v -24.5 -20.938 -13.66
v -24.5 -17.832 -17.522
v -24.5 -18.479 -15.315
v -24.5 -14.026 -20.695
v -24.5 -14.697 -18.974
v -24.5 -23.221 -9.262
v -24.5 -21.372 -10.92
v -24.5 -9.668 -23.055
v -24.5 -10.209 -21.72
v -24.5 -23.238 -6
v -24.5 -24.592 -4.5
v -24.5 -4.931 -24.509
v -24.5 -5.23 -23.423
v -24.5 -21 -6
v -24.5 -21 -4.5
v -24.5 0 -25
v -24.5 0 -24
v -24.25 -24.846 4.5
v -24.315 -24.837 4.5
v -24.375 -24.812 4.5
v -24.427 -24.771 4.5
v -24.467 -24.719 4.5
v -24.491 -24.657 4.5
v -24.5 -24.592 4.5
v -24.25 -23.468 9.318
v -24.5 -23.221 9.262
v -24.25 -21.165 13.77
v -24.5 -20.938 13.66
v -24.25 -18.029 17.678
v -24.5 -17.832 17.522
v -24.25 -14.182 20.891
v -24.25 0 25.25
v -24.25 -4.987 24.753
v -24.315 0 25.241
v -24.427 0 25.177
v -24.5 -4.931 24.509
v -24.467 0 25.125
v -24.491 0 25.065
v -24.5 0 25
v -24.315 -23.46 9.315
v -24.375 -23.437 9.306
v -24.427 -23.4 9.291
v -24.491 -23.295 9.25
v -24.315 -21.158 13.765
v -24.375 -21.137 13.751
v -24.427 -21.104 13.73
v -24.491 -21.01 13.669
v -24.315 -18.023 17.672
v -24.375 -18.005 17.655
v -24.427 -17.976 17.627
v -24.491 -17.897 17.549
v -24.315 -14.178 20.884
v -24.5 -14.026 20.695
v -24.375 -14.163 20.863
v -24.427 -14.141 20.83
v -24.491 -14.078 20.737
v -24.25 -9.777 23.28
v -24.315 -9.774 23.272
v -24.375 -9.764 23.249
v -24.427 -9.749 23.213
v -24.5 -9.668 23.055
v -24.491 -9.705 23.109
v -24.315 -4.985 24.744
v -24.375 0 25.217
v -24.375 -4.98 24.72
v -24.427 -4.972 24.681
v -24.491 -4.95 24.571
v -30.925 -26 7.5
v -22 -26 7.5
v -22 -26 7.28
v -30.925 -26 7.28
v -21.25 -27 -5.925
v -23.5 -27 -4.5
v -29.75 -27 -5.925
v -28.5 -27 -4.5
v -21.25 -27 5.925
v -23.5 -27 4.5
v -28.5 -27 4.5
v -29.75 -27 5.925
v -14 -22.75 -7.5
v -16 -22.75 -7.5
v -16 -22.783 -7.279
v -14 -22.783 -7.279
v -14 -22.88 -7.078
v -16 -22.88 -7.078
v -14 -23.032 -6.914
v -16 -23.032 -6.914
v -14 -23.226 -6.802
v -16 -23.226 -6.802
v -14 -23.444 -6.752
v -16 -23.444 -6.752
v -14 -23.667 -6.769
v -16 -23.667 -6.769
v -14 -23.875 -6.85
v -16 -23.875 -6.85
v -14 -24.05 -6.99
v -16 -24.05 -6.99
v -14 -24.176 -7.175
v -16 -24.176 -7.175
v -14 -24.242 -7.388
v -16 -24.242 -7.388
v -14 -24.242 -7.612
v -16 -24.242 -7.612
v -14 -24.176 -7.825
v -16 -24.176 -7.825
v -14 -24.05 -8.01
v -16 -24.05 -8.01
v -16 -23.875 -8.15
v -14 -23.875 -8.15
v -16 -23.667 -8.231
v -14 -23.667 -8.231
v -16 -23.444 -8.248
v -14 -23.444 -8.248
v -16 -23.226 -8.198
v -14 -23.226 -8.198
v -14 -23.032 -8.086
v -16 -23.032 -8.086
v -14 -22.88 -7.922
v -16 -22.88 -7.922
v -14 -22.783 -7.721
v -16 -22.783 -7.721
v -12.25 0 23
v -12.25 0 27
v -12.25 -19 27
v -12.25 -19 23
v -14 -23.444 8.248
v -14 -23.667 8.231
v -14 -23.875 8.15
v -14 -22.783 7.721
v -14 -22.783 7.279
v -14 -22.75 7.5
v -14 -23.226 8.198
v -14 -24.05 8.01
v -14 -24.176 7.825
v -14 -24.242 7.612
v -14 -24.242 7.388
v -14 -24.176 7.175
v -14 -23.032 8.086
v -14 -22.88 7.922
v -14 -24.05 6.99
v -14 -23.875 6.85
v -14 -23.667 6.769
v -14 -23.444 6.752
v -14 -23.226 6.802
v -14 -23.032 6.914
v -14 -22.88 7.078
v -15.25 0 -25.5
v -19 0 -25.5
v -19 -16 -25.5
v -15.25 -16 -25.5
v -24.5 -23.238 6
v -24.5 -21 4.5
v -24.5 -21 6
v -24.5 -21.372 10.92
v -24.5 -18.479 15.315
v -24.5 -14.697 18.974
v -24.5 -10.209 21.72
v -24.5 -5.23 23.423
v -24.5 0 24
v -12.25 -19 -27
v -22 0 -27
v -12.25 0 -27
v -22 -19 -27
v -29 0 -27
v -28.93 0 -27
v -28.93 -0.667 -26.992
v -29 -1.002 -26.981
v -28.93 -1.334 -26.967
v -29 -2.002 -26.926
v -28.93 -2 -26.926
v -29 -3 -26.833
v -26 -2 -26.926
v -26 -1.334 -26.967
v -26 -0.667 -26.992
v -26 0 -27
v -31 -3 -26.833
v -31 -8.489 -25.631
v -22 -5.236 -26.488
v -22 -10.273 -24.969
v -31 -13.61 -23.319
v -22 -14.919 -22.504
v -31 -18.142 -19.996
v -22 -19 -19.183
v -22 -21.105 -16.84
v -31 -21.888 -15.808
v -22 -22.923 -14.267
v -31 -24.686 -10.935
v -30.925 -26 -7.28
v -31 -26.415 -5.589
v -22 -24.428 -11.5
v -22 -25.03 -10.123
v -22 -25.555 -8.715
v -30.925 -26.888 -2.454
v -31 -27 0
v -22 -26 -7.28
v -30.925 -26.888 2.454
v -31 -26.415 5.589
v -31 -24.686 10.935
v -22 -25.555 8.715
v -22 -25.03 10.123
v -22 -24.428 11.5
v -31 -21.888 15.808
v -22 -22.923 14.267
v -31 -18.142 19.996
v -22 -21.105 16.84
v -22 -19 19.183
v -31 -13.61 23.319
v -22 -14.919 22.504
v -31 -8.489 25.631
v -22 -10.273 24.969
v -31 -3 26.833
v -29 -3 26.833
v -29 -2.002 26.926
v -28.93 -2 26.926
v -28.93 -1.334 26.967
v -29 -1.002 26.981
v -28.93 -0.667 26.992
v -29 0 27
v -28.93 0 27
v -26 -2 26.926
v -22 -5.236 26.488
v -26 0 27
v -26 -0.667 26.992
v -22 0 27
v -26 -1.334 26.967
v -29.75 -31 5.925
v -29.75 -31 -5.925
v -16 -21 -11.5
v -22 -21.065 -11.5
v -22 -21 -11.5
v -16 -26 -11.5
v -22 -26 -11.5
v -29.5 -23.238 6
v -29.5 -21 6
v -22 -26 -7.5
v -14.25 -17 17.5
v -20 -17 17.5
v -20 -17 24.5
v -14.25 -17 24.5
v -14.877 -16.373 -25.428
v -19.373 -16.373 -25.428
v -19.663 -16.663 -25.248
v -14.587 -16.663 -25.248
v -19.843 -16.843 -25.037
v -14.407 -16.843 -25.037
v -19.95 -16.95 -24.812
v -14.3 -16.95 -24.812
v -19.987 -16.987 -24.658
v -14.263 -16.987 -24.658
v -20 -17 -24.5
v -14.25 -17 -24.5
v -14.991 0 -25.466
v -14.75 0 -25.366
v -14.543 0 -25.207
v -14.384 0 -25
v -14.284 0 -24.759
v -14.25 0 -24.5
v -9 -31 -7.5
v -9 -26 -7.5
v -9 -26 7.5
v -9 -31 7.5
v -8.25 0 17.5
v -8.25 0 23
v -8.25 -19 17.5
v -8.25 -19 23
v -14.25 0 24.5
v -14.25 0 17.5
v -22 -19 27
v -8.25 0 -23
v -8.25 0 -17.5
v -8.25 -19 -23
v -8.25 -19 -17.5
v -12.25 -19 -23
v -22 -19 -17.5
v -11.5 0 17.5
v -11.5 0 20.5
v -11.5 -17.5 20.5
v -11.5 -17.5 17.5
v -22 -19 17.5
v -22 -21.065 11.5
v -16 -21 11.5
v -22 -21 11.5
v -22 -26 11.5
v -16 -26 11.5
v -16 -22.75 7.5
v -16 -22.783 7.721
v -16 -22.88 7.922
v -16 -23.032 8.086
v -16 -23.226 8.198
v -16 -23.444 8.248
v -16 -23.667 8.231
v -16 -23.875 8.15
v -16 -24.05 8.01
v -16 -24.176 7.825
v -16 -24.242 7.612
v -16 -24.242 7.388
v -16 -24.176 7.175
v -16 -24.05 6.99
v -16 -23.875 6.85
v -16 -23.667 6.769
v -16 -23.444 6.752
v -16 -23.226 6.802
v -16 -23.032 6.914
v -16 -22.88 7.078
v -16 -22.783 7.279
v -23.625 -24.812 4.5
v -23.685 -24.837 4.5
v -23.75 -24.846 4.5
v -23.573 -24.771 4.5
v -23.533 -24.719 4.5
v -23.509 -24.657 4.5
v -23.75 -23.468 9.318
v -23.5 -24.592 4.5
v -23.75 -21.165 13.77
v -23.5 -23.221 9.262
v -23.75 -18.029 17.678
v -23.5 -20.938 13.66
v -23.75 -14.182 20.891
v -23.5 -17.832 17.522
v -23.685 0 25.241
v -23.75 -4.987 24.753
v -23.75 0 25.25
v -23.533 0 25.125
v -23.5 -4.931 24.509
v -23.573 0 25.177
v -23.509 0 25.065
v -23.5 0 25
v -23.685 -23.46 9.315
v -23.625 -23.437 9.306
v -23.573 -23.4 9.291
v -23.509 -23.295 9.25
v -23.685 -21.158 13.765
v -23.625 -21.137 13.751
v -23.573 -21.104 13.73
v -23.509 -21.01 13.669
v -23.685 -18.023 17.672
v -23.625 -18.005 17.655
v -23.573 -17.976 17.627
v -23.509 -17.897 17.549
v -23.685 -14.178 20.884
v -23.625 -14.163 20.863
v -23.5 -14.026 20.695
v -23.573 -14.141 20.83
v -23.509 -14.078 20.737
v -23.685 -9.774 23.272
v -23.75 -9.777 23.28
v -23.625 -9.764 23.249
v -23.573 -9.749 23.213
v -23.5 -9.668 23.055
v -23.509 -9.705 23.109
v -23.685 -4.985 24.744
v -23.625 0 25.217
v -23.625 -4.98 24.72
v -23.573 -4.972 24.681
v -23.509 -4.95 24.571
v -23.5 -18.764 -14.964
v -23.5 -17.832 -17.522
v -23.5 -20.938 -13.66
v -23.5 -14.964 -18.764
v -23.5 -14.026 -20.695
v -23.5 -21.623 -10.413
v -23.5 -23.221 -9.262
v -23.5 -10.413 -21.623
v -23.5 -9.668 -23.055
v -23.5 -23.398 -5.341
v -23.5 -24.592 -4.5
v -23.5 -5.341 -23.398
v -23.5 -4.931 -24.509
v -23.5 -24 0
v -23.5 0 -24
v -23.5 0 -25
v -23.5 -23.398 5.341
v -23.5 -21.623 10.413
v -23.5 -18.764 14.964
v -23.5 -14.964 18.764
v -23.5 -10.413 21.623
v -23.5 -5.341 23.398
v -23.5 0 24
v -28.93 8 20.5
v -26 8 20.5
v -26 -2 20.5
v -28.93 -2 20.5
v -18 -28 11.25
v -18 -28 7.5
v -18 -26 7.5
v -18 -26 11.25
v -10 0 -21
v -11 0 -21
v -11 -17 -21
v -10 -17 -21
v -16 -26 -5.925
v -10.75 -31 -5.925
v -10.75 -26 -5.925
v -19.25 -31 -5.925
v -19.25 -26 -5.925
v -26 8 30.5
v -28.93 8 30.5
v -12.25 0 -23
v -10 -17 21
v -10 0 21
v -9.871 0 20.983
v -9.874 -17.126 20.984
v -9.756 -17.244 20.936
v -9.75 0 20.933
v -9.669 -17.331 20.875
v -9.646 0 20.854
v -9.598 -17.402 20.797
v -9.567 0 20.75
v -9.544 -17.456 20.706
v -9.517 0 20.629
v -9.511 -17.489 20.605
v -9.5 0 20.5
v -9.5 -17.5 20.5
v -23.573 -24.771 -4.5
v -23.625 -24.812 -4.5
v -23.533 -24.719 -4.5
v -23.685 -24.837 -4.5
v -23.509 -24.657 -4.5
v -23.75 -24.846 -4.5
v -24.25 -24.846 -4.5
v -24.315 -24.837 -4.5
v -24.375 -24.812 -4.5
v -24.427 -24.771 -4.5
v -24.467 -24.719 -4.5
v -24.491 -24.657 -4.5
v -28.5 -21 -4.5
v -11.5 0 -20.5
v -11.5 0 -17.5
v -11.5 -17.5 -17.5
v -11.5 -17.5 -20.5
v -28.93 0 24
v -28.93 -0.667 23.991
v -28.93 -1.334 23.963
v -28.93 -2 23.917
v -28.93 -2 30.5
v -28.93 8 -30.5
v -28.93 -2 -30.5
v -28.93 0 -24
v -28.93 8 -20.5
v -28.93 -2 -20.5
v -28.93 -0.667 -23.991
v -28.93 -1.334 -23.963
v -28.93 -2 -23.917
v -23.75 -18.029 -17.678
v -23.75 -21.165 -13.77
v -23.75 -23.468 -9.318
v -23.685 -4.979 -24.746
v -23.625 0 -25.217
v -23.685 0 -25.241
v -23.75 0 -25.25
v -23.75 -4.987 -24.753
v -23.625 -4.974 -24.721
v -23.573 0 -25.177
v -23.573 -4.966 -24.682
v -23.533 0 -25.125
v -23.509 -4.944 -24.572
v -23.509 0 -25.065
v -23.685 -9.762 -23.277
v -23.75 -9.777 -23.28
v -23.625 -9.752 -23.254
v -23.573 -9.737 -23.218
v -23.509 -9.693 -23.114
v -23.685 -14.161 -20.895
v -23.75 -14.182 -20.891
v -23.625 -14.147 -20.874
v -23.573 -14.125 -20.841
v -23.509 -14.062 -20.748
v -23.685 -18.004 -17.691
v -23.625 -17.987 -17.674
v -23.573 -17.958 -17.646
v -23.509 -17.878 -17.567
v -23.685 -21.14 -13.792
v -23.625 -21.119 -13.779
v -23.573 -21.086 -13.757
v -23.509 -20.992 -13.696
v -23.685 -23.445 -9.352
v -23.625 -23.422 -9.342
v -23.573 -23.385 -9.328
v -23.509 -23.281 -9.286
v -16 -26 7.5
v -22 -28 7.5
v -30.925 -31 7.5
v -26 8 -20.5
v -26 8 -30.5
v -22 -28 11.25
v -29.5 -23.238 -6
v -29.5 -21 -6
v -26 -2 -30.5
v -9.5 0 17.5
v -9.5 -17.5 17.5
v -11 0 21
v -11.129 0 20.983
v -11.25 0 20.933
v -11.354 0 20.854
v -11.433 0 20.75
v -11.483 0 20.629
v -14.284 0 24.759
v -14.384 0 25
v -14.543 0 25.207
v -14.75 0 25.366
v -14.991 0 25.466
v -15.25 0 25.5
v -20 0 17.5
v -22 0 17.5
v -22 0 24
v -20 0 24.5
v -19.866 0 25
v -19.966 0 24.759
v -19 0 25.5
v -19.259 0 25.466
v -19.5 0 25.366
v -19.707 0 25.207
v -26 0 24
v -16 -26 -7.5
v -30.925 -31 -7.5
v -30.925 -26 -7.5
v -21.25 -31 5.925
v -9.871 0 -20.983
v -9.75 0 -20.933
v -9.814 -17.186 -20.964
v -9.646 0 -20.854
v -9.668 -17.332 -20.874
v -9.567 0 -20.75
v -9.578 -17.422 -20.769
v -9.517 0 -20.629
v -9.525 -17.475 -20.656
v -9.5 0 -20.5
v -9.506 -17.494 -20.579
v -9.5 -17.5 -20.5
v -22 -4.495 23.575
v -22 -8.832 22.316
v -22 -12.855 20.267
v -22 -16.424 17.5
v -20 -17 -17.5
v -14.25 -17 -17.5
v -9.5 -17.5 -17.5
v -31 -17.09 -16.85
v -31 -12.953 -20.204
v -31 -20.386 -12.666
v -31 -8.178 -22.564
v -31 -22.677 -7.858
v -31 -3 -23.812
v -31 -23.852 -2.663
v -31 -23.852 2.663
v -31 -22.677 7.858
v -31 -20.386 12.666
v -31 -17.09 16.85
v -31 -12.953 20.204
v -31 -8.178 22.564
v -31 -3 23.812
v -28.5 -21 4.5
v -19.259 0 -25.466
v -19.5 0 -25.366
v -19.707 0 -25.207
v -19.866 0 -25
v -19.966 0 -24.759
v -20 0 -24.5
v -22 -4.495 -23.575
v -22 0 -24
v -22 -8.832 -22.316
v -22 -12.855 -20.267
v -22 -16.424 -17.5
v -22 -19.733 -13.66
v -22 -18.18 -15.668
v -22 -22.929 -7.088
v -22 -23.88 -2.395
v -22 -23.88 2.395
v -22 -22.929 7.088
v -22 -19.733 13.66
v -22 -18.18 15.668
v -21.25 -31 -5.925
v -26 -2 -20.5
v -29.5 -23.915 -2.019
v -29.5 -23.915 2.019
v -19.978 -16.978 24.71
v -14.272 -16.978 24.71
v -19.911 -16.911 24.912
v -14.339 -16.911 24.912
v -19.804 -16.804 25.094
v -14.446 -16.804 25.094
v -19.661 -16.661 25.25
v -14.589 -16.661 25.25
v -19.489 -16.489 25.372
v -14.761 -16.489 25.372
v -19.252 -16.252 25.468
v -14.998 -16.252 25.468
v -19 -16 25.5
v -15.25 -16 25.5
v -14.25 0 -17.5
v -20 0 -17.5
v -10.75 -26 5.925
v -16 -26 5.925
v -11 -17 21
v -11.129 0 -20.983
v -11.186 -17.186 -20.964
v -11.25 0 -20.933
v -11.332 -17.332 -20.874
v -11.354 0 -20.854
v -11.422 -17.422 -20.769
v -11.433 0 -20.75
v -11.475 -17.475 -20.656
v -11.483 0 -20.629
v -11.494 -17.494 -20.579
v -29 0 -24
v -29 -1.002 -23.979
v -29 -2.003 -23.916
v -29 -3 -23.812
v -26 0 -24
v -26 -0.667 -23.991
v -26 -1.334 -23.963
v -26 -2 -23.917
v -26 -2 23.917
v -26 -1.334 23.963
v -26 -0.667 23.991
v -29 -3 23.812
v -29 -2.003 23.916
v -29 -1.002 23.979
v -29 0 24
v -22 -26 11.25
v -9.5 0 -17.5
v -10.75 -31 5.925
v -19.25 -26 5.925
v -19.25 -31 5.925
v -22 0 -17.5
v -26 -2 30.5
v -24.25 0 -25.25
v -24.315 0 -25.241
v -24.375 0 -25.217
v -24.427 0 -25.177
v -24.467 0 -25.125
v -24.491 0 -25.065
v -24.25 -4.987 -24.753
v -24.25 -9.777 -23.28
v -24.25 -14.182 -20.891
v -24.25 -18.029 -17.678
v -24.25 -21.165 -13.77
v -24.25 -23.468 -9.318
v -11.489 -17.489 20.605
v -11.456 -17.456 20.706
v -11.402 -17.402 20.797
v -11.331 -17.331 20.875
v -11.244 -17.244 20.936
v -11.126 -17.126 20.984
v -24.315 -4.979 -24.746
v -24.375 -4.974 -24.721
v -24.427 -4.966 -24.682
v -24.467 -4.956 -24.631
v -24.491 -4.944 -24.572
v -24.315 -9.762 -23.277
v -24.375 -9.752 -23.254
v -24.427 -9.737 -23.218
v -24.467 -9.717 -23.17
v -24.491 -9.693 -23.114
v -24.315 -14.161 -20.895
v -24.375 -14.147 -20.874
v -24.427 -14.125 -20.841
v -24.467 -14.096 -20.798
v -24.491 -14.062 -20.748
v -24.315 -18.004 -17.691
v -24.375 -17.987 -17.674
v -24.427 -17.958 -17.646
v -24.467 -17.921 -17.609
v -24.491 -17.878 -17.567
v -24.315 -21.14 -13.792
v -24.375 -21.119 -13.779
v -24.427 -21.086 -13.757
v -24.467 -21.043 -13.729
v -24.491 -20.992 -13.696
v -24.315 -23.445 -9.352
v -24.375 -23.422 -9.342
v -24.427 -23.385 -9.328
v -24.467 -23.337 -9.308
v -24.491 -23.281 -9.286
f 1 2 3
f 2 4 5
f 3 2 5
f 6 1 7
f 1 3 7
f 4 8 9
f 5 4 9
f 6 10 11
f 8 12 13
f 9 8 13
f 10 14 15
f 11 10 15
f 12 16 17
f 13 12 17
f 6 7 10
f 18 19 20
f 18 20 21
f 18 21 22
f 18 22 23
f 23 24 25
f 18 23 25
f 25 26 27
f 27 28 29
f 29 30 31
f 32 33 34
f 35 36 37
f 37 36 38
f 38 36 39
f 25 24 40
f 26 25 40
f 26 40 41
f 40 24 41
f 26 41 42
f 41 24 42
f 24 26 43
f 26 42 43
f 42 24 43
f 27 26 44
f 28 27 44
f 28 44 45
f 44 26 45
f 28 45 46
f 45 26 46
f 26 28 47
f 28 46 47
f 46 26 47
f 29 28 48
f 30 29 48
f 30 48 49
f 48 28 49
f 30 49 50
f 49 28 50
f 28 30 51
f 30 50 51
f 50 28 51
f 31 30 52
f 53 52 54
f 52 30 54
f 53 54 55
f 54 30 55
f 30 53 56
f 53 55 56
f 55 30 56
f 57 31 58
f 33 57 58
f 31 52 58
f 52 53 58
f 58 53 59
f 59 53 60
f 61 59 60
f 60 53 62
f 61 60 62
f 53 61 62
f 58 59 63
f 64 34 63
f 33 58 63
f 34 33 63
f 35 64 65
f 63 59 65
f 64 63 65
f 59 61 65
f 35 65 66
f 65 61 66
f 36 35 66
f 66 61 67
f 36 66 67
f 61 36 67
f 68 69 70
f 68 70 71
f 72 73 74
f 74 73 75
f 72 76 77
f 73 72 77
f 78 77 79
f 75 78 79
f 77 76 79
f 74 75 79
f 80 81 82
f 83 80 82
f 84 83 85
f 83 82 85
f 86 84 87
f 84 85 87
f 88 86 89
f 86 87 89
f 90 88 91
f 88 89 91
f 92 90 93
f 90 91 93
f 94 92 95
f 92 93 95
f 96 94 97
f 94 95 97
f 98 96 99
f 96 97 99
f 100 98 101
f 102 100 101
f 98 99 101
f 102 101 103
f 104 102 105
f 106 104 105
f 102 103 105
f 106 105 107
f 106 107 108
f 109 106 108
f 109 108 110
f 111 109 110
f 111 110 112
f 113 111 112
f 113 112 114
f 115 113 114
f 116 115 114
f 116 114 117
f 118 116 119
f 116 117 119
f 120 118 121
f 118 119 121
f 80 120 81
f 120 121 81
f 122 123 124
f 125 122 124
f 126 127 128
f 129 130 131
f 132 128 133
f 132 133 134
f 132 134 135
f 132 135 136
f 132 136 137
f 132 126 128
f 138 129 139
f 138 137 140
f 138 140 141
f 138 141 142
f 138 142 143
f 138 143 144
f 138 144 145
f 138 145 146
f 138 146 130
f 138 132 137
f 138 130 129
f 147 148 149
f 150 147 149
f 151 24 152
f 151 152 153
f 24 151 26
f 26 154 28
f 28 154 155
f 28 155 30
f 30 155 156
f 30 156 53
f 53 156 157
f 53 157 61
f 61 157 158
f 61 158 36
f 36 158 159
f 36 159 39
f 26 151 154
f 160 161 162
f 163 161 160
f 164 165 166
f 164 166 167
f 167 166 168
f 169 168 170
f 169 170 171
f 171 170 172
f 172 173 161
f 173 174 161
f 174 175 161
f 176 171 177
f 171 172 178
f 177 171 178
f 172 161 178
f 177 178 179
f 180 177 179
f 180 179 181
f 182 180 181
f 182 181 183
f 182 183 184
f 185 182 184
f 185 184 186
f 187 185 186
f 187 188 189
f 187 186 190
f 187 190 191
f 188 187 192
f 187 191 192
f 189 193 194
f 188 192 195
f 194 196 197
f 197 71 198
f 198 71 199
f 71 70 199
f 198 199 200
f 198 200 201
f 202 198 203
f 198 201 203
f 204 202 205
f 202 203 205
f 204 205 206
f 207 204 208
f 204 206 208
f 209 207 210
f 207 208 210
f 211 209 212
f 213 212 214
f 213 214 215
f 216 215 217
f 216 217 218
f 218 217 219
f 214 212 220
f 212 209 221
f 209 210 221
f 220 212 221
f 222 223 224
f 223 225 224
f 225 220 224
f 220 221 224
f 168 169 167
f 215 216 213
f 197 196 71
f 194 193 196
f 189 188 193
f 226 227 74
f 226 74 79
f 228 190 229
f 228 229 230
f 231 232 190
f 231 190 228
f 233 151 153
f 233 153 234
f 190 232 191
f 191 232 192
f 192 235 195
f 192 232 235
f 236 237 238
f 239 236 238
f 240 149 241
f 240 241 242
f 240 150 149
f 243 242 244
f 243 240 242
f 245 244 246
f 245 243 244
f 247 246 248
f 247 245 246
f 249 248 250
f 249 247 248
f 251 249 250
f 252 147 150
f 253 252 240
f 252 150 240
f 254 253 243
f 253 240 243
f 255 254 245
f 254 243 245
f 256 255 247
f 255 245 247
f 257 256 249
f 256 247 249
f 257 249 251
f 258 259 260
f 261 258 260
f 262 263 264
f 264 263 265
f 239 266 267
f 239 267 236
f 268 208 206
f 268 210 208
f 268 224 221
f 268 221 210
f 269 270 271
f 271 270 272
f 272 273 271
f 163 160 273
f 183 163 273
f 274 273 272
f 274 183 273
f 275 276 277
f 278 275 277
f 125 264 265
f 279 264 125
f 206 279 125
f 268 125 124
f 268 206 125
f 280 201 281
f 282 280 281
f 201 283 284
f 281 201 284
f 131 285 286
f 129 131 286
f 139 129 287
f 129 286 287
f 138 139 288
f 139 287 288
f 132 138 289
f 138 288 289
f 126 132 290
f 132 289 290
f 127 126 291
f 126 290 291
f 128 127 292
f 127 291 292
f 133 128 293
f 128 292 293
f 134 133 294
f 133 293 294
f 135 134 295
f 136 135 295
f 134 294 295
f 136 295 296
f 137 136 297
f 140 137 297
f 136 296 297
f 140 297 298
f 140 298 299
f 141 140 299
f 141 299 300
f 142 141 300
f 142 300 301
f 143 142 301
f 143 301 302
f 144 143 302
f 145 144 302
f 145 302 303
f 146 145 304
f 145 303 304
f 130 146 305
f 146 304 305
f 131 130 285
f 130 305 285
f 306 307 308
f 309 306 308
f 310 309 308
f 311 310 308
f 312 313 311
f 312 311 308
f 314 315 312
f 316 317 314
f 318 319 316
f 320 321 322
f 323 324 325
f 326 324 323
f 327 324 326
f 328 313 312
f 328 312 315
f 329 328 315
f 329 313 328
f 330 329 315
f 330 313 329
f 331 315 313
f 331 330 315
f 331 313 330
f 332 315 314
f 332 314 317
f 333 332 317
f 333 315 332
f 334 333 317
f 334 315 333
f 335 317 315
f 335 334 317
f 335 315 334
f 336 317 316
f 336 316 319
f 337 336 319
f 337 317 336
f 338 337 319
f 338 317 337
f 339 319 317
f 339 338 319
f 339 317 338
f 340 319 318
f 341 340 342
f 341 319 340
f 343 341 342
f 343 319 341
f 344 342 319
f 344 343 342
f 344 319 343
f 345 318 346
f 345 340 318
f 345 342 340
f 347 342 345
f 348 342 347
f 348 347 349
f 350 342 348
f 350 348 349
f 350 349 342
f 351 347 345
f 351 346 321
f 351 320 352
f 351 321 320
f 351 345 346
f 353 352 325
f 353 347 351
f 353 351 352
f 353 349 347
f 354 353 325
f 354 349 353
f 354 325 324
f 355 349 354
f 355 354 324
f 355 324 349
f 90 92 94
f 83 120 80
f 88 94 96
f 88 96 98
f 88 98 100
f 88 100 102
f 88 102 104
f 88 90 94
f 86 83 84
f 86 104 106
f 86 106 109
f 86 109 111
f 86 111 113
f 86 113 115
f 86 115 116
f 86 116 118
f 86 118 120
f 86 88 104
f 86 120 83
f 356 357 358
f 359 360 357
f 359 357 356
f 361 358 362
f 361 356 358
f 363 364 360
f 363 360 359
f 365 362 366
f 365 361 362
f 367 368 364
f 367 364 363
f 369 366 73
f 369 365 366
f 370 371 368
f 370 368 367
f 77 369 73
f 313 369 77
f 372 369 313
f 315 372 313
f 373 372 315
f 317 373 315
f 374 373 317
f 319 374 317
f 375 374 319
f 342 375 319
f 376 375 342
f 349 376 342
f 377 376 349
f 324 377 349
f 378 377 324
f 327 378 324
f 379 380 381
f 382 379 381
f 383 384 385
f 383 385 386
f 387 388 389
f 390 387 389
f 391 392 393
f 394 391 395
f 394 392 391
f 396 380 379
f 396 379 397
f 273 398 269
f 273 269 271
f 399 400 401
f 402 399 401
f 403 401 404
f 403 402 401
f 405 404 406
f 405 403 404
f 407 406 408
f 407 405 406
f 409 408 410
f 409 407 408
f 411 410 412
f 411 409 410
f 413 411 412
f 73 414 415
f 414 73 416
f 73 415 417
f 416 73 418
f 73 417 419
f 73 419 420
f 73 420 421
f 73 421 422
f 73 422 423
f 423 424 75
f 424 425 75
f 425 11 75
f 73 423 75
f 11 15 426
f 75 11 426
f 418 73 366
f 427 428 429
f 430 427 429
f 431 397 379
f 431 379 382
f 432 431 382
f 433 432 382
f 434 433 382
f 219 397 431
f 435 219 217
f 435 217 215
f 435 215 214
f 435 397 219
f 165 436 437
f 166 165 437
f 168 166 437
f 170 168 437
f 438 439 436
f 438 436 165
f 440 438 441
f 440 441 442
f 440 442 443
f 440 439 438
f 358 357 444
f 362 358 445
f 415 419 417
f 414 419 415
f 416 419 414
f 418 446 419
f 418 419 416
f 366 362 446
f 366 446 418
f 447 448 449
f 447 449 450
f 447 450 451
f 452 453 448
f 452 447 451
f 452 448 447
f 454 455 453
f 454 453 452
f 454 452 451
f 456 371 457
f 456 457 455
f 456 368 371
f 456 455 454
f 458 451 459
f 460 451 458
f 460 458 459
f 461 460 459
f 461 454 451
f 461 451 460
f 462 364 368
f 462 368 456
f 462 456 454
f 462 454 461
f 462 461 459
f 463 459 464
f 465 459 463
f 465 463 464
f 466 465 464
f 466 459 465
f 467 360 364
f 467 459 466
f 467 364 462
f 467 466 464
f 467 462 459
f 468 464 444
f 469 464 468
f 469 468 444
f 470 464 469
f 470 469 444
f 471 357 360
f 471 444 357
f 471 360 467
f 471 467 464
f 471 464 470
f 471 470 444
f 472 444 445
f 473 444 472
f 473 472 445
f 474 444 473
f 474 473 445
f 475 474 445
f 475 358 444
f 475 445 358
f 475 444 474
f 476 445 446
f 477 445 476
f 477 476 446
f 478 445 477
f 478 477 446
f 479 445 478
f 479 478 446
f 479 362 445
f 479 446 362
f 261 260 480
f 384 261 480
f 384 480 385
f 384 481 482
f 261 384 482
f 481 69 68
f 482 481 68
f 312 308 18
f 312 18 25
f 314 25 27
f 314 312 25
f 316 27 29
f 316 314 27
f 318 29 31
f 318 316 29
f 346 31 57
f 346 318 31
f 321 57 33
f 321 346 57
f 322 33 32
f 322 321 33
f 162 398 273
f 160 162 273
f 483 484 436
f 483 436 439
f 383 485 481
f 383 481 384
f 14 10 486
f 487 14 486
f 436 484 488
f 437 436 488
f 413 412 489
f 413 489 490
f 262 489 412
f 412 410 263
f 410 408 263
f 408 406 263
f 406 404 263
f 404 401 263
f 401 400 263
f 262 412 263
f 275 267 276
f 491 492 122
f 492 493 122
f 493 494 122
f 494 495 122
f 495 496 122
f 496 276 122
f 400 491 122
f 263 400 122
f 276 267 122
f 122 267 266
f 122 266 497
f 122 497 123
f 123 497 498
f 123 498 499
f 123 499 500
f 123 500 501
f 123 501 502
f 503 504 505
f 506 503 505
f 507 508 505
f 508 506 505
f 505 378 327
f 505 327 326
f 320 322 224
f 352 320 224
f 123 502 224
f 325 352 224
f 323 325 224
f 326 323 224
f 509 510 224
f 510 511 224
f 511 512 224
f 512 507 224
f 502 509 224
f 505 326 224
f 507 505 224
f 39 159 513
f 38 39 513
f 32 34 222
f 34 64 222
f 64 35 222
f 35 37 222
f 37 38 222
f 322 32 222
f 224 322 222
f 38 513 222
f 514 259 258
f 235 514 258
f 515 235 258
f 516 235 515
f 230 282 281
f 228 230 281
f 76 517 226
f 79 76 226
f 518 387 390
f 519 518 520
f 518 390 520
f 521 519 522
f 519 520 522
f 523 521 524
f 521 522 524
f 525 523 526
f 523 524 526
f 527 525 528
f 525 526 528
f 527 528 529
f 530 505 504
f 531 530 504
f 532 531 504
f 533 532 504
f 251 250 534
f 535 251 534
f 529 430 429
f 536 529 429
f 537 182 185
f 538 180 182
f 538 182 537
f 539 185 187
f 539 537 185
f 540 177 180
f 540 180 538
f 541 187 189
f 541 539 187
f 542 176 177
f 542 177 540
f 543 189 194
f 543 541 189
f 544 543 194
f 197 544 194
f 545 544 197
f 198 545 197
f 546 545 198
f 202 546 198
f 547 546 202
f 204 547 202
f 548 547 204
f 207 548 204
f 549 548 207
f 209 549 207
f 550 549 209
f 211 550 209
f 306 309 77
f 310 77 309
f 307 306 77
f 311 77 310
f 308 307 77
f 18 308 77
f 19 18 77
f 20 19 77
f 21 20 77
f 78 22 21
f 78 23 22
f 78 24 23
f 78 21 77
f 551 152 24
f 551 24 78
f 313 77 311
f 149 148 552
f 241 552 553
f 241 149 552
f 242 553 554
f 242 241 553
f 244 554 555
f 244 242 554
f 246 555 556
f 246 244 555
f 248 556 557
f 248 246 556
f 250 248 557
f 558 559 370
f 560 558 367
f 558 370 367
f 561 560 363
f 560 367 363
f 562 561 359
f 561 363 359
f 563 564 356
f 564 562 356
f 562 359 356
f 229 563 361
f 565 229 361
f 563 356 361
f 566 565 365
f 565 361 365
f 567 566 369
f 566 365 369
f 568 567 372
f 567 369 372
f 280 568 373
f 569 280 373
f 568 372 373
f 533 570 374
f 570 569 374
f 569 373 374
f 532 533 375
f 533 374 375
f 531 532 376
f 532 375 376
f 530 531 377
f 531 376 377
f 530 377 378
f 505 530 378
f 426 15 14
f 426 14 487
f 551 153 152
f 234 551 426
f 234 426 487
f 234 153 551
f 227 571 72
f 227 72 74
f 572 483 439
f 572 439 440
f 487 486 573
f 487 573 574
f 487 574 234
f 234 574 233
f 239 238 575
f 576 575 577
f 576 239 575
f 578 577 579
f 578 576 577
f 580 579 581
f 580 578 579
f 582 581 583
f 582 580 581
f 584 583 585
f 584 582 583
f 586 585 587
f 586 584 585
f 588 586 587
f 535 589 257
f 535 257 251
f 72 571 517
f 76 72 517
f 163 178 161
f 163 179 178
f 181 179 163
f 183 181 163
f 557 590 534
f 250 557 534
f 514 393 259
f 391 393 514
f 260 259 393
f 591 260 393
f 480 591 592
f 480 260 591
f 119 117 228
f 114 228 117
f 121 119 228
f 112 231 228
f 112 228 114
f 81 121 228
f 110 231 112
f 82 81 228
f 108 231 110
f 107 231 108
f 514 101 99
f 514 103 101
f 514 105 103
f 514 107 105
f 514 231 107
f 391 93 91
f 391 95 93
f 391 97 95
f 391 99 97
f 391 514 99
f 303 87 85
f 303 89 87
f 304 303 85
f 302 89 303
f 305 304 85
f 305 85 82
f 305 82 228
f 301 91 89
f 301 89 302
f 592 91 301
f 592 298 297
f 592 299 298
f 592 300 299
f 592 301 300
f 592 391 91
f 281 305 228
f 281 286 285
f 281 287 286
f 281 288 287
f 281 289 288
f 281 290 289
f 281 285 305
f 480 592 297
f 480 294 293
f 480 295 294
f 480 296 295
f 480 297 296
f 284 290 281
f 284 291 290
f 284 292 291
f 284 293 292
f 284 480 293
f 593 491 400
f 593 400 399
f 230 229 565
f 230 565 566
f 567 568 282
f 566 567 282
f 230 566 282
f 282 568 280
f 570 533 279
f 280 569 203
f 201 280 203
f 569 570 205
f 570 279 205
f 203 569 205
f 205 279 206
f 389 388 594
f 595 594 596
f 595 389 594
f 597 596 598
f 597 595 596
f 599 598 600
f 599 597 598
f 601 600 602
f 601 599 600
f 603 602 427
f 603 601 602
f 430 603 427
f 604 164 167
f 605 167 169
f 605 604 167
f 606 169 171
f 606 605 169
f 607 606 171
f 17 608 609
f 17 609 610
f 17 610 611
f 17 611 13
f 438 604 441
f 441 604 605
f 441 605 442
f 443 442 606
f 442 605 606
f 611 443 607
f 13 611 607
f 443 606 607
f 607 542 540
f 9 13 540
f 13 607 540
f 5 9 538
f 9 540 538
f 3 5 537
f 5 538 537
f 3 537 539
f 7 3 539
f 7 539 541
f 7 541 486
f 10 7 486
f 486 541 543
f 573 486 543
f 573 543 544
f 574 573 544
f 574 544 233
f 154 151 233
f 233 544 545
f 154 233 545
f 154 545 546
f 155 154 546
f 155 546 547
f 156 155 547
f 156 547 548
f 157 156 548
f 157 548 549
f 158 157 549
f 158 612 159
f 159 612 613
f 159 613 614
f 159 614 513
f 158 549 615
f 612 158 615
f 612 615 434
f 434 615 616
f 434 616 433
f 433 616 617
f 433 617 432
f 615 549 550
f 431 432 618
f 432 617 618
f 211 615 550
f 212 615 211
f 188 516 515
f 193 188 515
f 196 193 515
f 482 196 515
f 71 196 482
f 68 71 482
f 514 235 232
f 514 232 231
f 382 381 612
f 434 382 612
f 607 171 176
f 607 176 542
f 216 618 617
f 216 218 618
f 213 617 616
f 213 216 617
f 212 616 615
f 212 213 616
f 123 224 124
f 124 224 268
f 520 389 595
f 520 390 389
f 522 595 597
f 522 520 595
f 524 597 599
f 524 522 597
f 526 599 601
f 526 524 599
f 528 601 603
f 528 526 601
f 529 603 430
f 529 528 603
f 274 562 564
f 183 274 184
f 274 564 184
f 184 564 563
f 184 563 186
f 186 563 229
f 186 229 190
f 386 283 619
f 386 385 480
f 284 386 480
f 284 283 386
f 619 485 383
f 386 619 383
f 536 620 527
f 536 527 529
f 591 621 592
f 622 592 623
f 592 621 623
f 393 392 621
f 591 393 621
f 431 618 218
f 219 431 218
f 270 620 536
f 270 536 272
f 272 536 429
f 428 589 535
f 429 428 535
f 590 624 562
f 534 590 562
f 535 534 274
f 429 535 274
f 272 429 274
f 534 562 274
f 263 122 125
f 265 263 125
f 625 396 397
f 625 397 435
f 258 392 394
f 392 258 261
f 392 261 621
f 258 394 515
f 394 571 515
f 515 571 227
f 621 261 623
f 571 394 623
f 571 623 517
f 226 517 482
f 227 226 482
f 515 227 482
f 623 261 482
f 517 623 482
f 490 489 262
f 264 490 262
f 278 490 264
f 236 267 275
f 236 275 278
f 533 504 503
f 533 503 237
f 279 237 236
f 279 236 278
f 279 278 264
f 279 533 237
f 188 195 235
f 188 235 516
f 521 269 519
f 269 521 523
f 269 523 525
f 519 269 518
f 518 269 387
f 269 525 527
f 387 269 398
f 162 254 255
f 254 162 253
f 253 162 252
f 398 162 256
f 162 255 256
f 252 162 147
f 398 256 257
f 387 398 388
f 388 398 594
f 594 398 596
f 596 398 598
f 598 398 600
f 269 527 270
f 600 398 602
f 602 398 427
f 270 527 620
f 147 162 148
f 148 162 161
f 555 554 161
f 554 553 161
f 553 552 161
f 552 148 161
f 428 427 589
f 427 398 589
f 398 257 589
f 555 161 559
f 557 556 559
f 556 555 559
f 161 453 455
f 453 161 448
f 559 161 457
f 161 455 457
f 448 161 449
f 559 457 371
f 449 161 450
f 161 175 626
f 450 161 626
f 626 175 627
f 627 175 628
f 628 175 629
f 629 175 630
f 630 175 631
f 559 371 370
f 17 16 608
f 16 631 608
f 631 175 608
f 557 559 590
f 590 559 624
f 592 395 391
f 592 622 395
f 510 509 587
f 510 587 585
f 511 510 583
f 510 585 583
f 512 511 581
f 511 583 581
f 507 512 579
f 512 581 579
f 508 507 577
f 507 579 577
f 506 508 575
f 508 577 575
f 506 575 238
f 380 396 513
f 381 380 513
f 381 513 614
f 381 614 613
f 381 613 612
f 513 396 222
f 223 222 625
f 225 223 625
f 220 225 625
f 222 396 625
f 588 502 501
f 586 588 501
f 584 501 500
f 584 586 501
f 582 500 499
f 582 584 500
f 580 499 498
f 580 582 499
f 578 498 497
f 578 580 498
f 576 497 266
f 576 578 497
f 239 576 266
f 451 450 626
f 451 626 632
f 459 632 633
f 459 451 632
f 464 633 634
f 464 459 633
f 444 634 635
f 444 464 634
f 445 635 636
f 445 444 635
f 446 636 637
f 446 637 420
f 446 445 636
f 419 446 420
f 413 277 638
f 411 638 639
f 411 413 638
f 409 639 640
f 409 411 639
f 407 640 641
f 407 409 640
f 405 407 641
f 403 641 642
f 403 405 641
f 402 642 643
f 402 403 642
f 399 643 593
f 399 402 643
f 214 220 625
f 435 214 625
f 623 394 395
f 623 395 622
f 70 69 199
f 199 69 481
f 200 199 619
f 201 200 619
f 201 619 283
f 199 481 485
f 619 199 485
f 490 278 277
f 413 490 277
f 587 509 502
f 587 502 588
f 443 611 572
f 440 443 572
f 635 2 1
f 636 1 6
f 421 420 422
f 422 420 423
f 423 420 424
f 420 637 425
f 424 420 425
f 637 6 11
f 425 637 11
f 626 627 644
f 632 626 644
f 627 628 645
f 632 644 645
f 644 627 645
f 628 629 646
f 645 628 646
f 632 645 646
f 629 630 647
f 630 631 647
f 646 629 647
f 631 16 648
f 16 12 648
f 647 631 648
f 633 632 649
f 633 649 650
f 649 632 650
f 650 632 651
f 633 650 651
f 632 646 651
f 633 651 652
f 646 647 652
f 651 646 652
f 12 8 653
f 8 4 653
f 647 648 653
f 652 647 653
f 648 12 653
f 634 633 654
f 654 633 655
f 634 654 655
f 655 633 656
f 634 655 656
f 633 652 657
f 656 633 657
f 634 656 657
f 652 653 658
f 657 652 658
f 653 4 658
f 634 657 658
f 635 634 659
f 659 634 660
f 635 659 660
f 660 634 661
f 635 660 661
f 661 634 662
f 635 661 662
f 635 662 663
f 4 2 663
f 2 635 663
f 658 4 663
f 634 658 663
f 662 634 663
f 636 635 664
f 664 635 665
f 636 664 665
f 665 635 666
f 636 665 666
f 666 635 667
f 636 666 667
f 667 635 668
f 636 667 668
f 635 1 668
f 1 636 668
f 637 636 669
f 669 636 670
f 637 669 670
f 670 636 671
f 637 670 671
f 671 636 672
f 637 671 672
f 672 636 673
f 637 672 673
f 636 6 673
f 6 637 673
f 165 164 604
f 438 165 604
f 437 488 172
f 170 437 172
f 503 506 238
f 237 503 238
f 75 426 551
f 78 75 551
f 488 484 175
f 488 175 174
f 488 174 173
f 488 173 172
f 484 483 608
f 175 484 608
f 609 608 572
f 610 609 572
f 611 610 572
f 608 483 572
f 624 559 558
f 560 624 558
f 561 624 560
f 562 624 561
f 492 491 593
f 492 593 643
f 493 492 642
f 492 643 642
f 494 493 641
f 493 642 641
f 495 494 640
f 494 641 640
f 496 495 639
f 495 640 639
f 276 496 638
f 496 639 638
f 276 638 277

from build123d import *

# Parameters (mm, degrees)
SKETCH062_W                               = 12
SKETCH062_H                               = 12
EXTRUDE035_DEPTH                          = 2
SKETCH061_W                               = 12
SKETCH061_H                               = 12
EXTRUDE034_DEPTH                          = 2
SKETCH029_AS_DRAWN_W                      = 4
SKETCH029_AS_DRAWN_H                      = 4
EXTRUDE021_DEPTH                          = 2
EXTRUDE021_ONTO_SKETCH029_ROLL_ANGLE      = 90
SKETCH020_W                               = 10
SKETCH020_H                               = 10
EXTRUDE014_DEPTH                          = 2.93
SKETCH018_W                               = 10
SKETCH018_H                               = 10
EXTRUDE013_DEPTH                          = 2.93
SKETCH016_AS_DRAWN_W                      = 5
SKETCH016_AS_DRAWN_H                      = 9
EXTRUDE009_DEPTH                          = 7
EXTRUDE009_ONTO_SKETCH016_ROLL_ANGLE      = 90
EXTRUDE009_ONTO_SKETCH016_PLACEMENT_ANGLE = 180
SKETCH013_AS_DRAWN_W                      = 8.5
SKETCH013_AS_DRAWN_H                      = 11.85
EXTRUDE011_DEPTH                          = 4
EXTRUDE011_ONTO_SKETCH013_ROLL_ANGLE      = 90
EXTRUDE011_ONTO_SKETCH013_PLACEMENT_ANGLE = 180
SKETCH015_AS_DRAWN_W                      = 10.75
SKETCH015_AS_DRAWN_H                      = 15
EXTRUDE010_DEPTH                          = 5
EXTRUDE010_ONTO_SKETCH015_ROLL_ANGLE      = 90
EXTRUDE010_ONTO_SKETCH015_PLACEMENT_ANGLE = 180
SKETCH017_AS_DRAWN_W                      = 5
SKETCH017_AS_DRAWN_H                      = 12
EXTRUDE008_DEPTH                          = 5
EXTRUDE008_ONTO_SKETCH017_ROLL_ANGLE      = 90
EXTRUDE008_ONTO_SKETCH017_PLACEMENT_ANGLE = 180
SKETCH012_W                               = 20
SKETCH012_H                               = 35
EXTRUDE007_DEPTH                          = 14
SKETCH007_R                               = 24
EXTRUDE006_DEPTH                          = 9
SKETCH011_W                               = 35
SKETCH011_H                               = 42
EXTRUDE005_DEPTH                          = 2
FILLET002_R                               = 0.5
SKETCH010_W                               = 19
SKETCH010_H                               = 46
EXTRUDE004_DEPTH                          = 4.25
SKETCH009_W                               = 34
SKETCH009_H                               = 51
EXTRUDE003_DEPTH                          = 5.75
FILLET001_R                               = 1
SKETCH008_W                               = 19
SKETCH008_H                               = 54
EXTRUDE002_DEPTH                          = 9.75
SKETCH006_R                               = 25.25
EXTRUDE001_DEPTH                          = 1
FILLET_R                                  = 0.25
EXTRUDE_DEPTH                             = 9
CUT_ROLL_ANGLE                            = -90
SKETCH025_R                               = 0.75
EXTRUDE017_DEPTH                          = 2
SKETCH028_AS_DRAWN_W                      = 8.5
SKETCH028_AS_DRAWN_H                      = 11.85
EXTRUDE020_DEPTH                          = 5
EXTRUDE020_ONTO_SKETCH028_ROLL_ANGLE      = 90
EXTRUDE020_ONTO_SKETCH028_PLACEMENT_ANGLE = 180
SKETCH027_AS_DRAWN_W                      = 11.25
SKETCH027_AS_DRAWN_H                      = 15
EXTRUDE019_DEPTH                          = 5
EXTRUDE019_ONTO_SKETCH027_ROLL_ANGLE      = 90
EXTRUDE019_ONTO_SKETCH027_PLACEMENT_ANGLE = 180
SKETCH019_AS_DRAWN_W                      = 6
SKETCH019_AS_DRAWN_H                      = 23
EXTRUDE012_DEPTH                          = 5
EXTRUDE012_ONTO_SKETCH019_ROLL_ANGLE      = 90


with BuildPart() as extrude035:
    # Sketch062 → Extrude035 (new body)
    with BuildSketch(Plane(origin=(-21, 0, 0), x_dir=(0, -1, 0), z_dir=(-1, 0, 0))):
        with Locations((-3, 25.5)):
            Rectangle(SKETCH062_W, SKETCH062_H)
    extrude(amount=EXTRUDE035_DEPTH)


with BuildPart() as extrude034:
    # Sketch061 → Extrude034 (new body)
    with BuildSketch(Plane(origin=(-21, 0, 0), x_dir=(0, -1, 0), z_dir=(-1, 0, 0))):
        with Locations((-3, -25.5)):
            Rectangle(SKETCH061_W, SKETCH061_H)
    extrude(amount=EXTRUDE034_DEPTH)


with BuildPart() as reset_standoff:
    # Sketch029 as drawn → Extrude021 (new)
    with BuildSketch(Plane.XY):
        with Locations((-12, 9.25)):
            Rectangle(SKETCH029_AS_DRAWN_W, SKETCH029_AS_DRAWN_H)
    extrude(amount=-EXTRUDE021_DEPTH)


with BuildPart() as reset_standoff_1:
    # Extrude021 onto Sketch029 roll: moved
    add(reset_standoff.part.rotate(Axis((0, 0, 0), (1, 0, 0)), EXTRUDE021_ONTO_SKETCH029_ROLL_ANGLE))


with BuildPart() as reset_standoff_2:
    # Extrude021 onto Sketch029 placement: moved
    add(reset_standoff_1.part.moved(Location((0, -28, 0))))


with BuildPart() as momentary_mount:
    # Sketch020 → Extrude014 (new body)
    with BuildSketch(Plane(origin=(-18, 0, 0), x_dir=(0, -1, 0), z_dir=(-1, 0, 0))):
        with Locations((-3, -25.5)):
            Rectangle(SKETCH020_W, SKETCH020_H)
    extrude(amount=EXTRUDE014_DEPTH)


with BuildPart() as pwr_button_mount:
    # Sketch018 → Extrude013 (new body)
    with BuildSketch(Plane(origin=(-18, 0, 0), x_dir=(0, -1, 0), z_dir=(-1, 0, 0))):
        with Locations((-3, 25.5)):
            Rectangle(SKETCH018_W, SKETCH018_H)
    extrude(amount=EXTRUDE013_DEPTH)


with BuildPart() as extrude009:
    # Sketch016 as drawn → Extrude009 (new)
    with BuildSketch(Plane.XY):
        with Locations((18, 0)):
            Rectangle(SKETCH016_AS_DRAWN_W, SKETCH016_AS_DRAWN_H)
    extrude(amount=-EXTRUDE009_DEPTH)


with BuildPart() as extrude009_1:
    # Extrude009 onto Sketch016 roll: moved
    add(extrude009.part.rotate(Axis((0, 0, 0), (1, 0, 0)), EXTRUDE009_ONTO_SKETCH016_ROLL_ANGLE))


with BuildPart() as extrude009_2:
    # Extrude009 onto Sketch016 placement: moved
    add(extrude009_1.part.moved(Location((0, -21, 0))).rotate(Axis((0, -21, 0), (0, 0, 1)), EXTRUDE009_ONTO_SKETCH016_PLACEMENT_ANGLE))


with BuildPart() as charge_port_cuts:
    # Sketch013 as drawn → Extrude011 (new)
    with BuildSketch(Plane.XY):
        with Locations((17.5, 0)):
            Rectangle(SKETCH013_AS_DRAWN_W, SKETCH013_AS_DRAWN_H)
    extrude(amount=EXTRUDE011_DEPTH)


with BuildPart() as charge_port_cuts_1:
    # Extrude011 onto Sketch013 roll: moved
    add(charge_port_cuts.part.rotate(Axis((0, 0, 0), (1, 0, 0)), EXTRUDE011_ONTO_SKETCH013_ROLL_ANGLE))


with BuildPart() as charge_port_cuts_2:
    # Extrude011 onto Sketch013 placement: moved
    add(charge_port_cuts_1.part.moved(Location((0, -31, 0))).rotate(Axis((0, -31, 0), (0, 0, 1)), EXTRUDE011_ONTO_SKETCH013_PLACEMENT_ANGLE))

    # Fusion004: union Extrude009
    add(extrude009_2.part)


with BuildPart() as extrude010:
    # Sketch015 as drawn → Extrude010 (new)
    with BuildSketch(Plane.XY):
        with Locations((17.55, 0)):
            Rectangle(SKETCH015_AS_DRAWN_W, SKETCH015_AS_DRAWN_H)
    extrude(amount=-EXTRUDE010_DEPTH)


with BuildPart() as extrude010_1:
    # Extrude010 onto Sketch015 roll: moved
    add(extrude010.part.rotate(Axis((0, 0, 0), (1, 0, 0)), EXTRUDE010_ONTO_SKETCH015_ROLL_ANGLE))


with BuildPart() as extrude010_2:
    # Extrude010 onto Sketch015 placement: moved
    add(extrude010_1.part.moved(Location((0, -26, 0))).rotate(Axis((0, -26, 0), (0, 0, 1)), EXTRUDE010_ONTO_SKETCH015_PLACEMENT_ANGLE))


with BuildPart() as charge_port_walls:
    # Sketch017 as drawn → Extrude008 (new)
    with BuildSketch(Plane.XY):
        with Locations((19, 0)):
            Rectangle(SKETCH017_AS_DRAWN_W, SKETCH017_AS_DRAWN_H)
    extrude(amount=EXTRUDE008_DEPTH)


with BuildPart() as charge_port_walls_1:
    # Extrude008 onto Sketch017 roll: moved
    add(charge_port_walls.part.rotate(Axis((0, 0, 0), (1, 0, 0)), EXTRUDE008_ONTO_SKETCH017_ROLL_ANGLE))


with BuildPart() as charge_port_walls_2:
    # Extrude008 onto Sketch017 placement: moved
    add(charge_port_walls_1.part.moved(Location((0, -26, 0))).rotate(Axis((0, -26, 0), (0, 0, 1)), EXTRUDE008_ONTO_SKETCH017_PLACEMENT_ANGLE))

    # Fusion002: union Extrude010
    add(extrude010_2.part)


with BuildPart() as extrude007:
    # Sketch012 → Extrude007 (new body)
    with BuildSketch(Plane(origin=(0, 0, 0), x_dir=(0, -1, 0), z_dir=(-1, 0, 0))):
        with Locations((10, 0)):
            Rectangle(SKETCH012_W, SKETCH012_H)
    extrude(amount=-EXTRUDE007_DEPTH)


with BuildPart() as fusion001:
    # Sketch007 → Extrude006 (new body)
    with BuildSketch(Plane(origin=(-9, 0, 0), x_dir=(0, -1, 0), z_dir=(-1, 0, 0))):
        Circle(SKETCH007_R)
    extrude(amount=-EXTRUDE006_DEPTH)

    # Fusion001: union Extrude007
    add(extrude007.part)


with BuildPart() as fillet002:
    # Sketch011 → Extrude005 (new body)
    with BuildSketch(Plane(origin=(10.5, 0, 0), x_dir=(0, -1, 0), z_dir=(-1, 0, 0))):
        Rectangle(SKETCH011_W, SKETCH011_H)
    extrude(amount=-EXTRUDE005_DEPTH)

    # Fillet002
    fillet002_edges = [fillet002.edges().sort_by_distance(p)[0] for p in [
        (11.5, 17.5, 21),
        (11.5, -17.5, 21),
        (10.5, 0, 21),
        (12.5, 0, 21),
        (11.5, -17.5, -21),
        (11.5, 17.5, -21),
        (10.5, 0, -21),
        (12.5, 0, -21),
    ]]
    fillet(fillet002_edges, radius=FILLET002_R)


with BuildPart() as motorboard:
    # Sketch010 → Extrude004 (new body)
    with BuildSketch(Plane(origin=(9.5, 0, 0), x_dir=(0, -1, 0), z_dir=(-1, 0, 0))):
        with Locations((9.5, 0)):
            Rectangle(SKETCH010_W, SKETCH010_H)
    extrude(amount=-EXTRUDE004_DEPTH)

    # Cut002: cut Fillet002
    add(fillet002.part, mode=Mode.SUBTRACT)


with BuildPart() as fillet001:
    # Sketch009 → Extrude003 (new body)
    with BuildSketch(Plane(origin=(2, 0, 0), x_dir=(0, -1, 0), z_dir=(-1, 0, 0))):
        Rectangle(SKETCH009_W, SKETCH009_H)
    extrude(amount=-EXTRUDE003_DEPTH)

    # Fillet001
    fillet001_edges = [fillet001.edges().sort_by_distance(p)[0] for p in [
        (4.875, 17, 25.5),
        (4.875, -17, 25.5),
        (2, 0, 25.5),
        (7.75, 0, 25.5),
        (4.875, -17, -25.5),
        (4.875, 17, -25.5),
        (2, 0, -25.5),
        (7.75, 0, -25.5),
    ]]
    fillet(fillet001_edges, radius=FILLET001_R)


with BuildPart() as battery:
    # Sketch008 → Extrude002 (new body)
    with BuildSketch(Plane(origin=(0, 0, 0), x_dir=(0, -1, 0), z_dir=(-1, 0, 0))):
        with Locations((9.5, 0)):
            Rectangle(SKETCH008_W, SKETCH008_H)
    extrude(amount=-EXTRUDE002_DEPTH)

    # Cut001: cut Fillet001
    add(fillet001.part, mode=Mode.SUBTRACT)


with BuildPart() as fillet_body:
    # Sketch006 → Extrude001 (new body)
    with BuildSketch(Plane(origin=(-1.5, 0, 0), x_dir=(0, -1, 0), z_dir=(-1, 0, 0))):
        Circle(SKETCH006_R)
    extrude(amount=EXTRUDE001_DEPTH)

    # Fillet
    fillet_edges = [fillet_body.edges().sort_by_distance(p)[0] for p in [
        (-1.5, 25.25, 0),
        (-2.5, 25.25, 0),
    ]]
    fillet(fillet_edges, radius=FILLET_R)


with BuildPart() as body_and_charge_port:
    # Sketch005 → Extrude (new body)
    with BuildSketch(Plane(origin=(0, 0, 0), x_dir=(0, -1, 0), z_dir=(-1, 0, 0))):
        with BuildLine():
            ThreePointArc((-27, 0), (0, -27), (27, 0))
            Line((-27, 0), (27, 0))
        make_face()
    extrude(amount=EXTRUDE_DEPTH)

    # Cut: cut Fillet body
    add(fillet_body.part, mode=Mode.SUBTRACT)


with BuildPart() as body_and_charge_port_1:
    # Cut roll: moved
    add(body_and_charge_port.part.rotate(Axis((0, 0, 0), (1, 0, 0)), CUT_ROLL_ANGLE))


with BuildPart() as body_and_charge_port_2:
    # Cut placement: moved
    add(body_and_charge_port_1.part)

    # Fusion: union MotorBoard, Battery
    add(motorboard.part)
    add(battery.part)

    # Cut003: cut Fusion001
    add(fusion001.part, mode=Mode.SUBTRACT)


with BuildPart() as body_and_charge_port_3:
    # Cut003 placement: moved
    add(body_and_charge_port_2.part.moved(Location((-14, 0, 0))))

    # Fusion003: union Charge Port Walls
    add(charge_port_walls_2.part)

    # Cut004: cut Charge Port Cuts
    add(charge_port_cuts_2.part, mode=Mode.SUBTRACT)


with BuildPart() as hacker_port_pegs:
    # Sketch025 → Extrude017 (new body)
    with BuildSketch(Plane.YZ.offset(-8)):
        with Locations((-23.5, 7.5)):
            Circle(SKETCH025_R)
        with Locations((-23.5, -7.5)):
            Circle(SKETCH025_R)
    extrude(amount=EXTRUDE017_DEPTH)


with BuildPart() as hacker_hole_cut001:
    # Sketch028 as drawn → Extrude020 (new)
    with BuildSketch(Plane.XY):
        with Locations((7, 0)):
            Rectangle(SKETCH028_AS_DRAWN_W, SKETCH028_AS_DRAWN_H)
    extrude(amount=EXTRUDE020_DEPTH)


with BuildPart() as hacker_hole_cut001_1:
    # Extrude020 onto Sketch028 roll: moved
    add(hacker_hole_cut001.part.rotate(Axis((0, 0, 0), (1, 0, 0)), EXTRUDE020_ONTO_SKETCH028_ROLL_ANGLE))


with BuildPart() as hacker_hole_cut001_2:
    # Extrude020 onto Sketch028 placement: moved
    add(hacker_hole_cut001_1.part.moved(Location((0, -31, 0))).rotate(Axis((0, -31, 0), (0, 0, 1)), EXTRUDE020_ONTO_SKETCH028_PLACEMENT_ANGLE))


with BuildPart() as cut005:
    # Sketch027 as drawn → Extrude019 (new)
    with BuildSketch(Plane.XY):
        with Locations((6.625, 0)):
            Rectangle(SKETCH027_AS_DRAWN_W, SKETCH027_AS_DRAWN_H)
    extrude(amount=-EXTRUDE019_DEPTH)


with BuildPart() as cut005_1:
    # Extrude019 onto Sketch027 roll: moved
    add(cut005.part.rotate(Axis((0, 0, 0), (1, 0, 0)), EXTRUDE019_ONTO_SKETCH027_ROLL_ANGLE))


with BuildPart() as cut005_2:
    # Extrude019 onto Sketch027 placement: moved
    add(cut005_1.part.moved(Location((0, -26, 0))).rotate(Axis((0, -26, 0), (0, 0, 1)), EXTRUDE019_ONTO_SKETCH027_PLACEMENT_ANGLE))

    # Cut005: cut Hacker hole cut001
    add(hacker_hole_cut001_2.part, mode=Mode.SUBTRACT)


with BuildPart() as part_holder001:
    # Sketch019 as drawn → Extrude012 (new)
    with BuildSketch(Plane.XY):
        with Locations((-11, 0)):
            Rectangle(SKETCH019_AS_DRAWN_W, SKETCH019_AS_DRAWN_H)
    extrude(amount=-EXTRUDE012_DEPTH)


with BuildPart() as part_holder001_1:
    # Extrude012 onto Sketch019 roll: moved
    add(part_holder001.part.rotate(Axis((0, 0, 0), (1, 0, 0)), EXTRUDE012_ONTO_SKETCH019_ROLL_ANGLE))


with BuildPart() as part_holder001_2:
    # Extrude012 onto Sketch019 placement: moved
    add(part_holder001_1.part.moved(Location((0, -26, 0))))

    # Fusion006: union Hacker Port Pegs, Cut005
    add(hacker_port_pegs.part)
    add(cut005_2.part)

    # Fusion007: union Reset Standoff, Momentary Mount, Pwr Button Mount, Body And Charge Port
    add(reset_standoff_2.part)
    add(momentary_mount.part)
    add(pwr_button_mount.part)
    add(body_and_charge_port_3.part)

    # Cut017: cut Extrude034
    add(extrude034.part, mode=Mode.SUBTRACT)

    # Cut018: cut Extrude035
    add(extrude035.part, mode=Mode.SUBTRACT)


with BuildPart() as part_holder001_3:
    # Cut018 placement: moved
    add(part_holder001_2.part.moved(Location((-8, 0, 0))))


solid = part_holder001_3.part
